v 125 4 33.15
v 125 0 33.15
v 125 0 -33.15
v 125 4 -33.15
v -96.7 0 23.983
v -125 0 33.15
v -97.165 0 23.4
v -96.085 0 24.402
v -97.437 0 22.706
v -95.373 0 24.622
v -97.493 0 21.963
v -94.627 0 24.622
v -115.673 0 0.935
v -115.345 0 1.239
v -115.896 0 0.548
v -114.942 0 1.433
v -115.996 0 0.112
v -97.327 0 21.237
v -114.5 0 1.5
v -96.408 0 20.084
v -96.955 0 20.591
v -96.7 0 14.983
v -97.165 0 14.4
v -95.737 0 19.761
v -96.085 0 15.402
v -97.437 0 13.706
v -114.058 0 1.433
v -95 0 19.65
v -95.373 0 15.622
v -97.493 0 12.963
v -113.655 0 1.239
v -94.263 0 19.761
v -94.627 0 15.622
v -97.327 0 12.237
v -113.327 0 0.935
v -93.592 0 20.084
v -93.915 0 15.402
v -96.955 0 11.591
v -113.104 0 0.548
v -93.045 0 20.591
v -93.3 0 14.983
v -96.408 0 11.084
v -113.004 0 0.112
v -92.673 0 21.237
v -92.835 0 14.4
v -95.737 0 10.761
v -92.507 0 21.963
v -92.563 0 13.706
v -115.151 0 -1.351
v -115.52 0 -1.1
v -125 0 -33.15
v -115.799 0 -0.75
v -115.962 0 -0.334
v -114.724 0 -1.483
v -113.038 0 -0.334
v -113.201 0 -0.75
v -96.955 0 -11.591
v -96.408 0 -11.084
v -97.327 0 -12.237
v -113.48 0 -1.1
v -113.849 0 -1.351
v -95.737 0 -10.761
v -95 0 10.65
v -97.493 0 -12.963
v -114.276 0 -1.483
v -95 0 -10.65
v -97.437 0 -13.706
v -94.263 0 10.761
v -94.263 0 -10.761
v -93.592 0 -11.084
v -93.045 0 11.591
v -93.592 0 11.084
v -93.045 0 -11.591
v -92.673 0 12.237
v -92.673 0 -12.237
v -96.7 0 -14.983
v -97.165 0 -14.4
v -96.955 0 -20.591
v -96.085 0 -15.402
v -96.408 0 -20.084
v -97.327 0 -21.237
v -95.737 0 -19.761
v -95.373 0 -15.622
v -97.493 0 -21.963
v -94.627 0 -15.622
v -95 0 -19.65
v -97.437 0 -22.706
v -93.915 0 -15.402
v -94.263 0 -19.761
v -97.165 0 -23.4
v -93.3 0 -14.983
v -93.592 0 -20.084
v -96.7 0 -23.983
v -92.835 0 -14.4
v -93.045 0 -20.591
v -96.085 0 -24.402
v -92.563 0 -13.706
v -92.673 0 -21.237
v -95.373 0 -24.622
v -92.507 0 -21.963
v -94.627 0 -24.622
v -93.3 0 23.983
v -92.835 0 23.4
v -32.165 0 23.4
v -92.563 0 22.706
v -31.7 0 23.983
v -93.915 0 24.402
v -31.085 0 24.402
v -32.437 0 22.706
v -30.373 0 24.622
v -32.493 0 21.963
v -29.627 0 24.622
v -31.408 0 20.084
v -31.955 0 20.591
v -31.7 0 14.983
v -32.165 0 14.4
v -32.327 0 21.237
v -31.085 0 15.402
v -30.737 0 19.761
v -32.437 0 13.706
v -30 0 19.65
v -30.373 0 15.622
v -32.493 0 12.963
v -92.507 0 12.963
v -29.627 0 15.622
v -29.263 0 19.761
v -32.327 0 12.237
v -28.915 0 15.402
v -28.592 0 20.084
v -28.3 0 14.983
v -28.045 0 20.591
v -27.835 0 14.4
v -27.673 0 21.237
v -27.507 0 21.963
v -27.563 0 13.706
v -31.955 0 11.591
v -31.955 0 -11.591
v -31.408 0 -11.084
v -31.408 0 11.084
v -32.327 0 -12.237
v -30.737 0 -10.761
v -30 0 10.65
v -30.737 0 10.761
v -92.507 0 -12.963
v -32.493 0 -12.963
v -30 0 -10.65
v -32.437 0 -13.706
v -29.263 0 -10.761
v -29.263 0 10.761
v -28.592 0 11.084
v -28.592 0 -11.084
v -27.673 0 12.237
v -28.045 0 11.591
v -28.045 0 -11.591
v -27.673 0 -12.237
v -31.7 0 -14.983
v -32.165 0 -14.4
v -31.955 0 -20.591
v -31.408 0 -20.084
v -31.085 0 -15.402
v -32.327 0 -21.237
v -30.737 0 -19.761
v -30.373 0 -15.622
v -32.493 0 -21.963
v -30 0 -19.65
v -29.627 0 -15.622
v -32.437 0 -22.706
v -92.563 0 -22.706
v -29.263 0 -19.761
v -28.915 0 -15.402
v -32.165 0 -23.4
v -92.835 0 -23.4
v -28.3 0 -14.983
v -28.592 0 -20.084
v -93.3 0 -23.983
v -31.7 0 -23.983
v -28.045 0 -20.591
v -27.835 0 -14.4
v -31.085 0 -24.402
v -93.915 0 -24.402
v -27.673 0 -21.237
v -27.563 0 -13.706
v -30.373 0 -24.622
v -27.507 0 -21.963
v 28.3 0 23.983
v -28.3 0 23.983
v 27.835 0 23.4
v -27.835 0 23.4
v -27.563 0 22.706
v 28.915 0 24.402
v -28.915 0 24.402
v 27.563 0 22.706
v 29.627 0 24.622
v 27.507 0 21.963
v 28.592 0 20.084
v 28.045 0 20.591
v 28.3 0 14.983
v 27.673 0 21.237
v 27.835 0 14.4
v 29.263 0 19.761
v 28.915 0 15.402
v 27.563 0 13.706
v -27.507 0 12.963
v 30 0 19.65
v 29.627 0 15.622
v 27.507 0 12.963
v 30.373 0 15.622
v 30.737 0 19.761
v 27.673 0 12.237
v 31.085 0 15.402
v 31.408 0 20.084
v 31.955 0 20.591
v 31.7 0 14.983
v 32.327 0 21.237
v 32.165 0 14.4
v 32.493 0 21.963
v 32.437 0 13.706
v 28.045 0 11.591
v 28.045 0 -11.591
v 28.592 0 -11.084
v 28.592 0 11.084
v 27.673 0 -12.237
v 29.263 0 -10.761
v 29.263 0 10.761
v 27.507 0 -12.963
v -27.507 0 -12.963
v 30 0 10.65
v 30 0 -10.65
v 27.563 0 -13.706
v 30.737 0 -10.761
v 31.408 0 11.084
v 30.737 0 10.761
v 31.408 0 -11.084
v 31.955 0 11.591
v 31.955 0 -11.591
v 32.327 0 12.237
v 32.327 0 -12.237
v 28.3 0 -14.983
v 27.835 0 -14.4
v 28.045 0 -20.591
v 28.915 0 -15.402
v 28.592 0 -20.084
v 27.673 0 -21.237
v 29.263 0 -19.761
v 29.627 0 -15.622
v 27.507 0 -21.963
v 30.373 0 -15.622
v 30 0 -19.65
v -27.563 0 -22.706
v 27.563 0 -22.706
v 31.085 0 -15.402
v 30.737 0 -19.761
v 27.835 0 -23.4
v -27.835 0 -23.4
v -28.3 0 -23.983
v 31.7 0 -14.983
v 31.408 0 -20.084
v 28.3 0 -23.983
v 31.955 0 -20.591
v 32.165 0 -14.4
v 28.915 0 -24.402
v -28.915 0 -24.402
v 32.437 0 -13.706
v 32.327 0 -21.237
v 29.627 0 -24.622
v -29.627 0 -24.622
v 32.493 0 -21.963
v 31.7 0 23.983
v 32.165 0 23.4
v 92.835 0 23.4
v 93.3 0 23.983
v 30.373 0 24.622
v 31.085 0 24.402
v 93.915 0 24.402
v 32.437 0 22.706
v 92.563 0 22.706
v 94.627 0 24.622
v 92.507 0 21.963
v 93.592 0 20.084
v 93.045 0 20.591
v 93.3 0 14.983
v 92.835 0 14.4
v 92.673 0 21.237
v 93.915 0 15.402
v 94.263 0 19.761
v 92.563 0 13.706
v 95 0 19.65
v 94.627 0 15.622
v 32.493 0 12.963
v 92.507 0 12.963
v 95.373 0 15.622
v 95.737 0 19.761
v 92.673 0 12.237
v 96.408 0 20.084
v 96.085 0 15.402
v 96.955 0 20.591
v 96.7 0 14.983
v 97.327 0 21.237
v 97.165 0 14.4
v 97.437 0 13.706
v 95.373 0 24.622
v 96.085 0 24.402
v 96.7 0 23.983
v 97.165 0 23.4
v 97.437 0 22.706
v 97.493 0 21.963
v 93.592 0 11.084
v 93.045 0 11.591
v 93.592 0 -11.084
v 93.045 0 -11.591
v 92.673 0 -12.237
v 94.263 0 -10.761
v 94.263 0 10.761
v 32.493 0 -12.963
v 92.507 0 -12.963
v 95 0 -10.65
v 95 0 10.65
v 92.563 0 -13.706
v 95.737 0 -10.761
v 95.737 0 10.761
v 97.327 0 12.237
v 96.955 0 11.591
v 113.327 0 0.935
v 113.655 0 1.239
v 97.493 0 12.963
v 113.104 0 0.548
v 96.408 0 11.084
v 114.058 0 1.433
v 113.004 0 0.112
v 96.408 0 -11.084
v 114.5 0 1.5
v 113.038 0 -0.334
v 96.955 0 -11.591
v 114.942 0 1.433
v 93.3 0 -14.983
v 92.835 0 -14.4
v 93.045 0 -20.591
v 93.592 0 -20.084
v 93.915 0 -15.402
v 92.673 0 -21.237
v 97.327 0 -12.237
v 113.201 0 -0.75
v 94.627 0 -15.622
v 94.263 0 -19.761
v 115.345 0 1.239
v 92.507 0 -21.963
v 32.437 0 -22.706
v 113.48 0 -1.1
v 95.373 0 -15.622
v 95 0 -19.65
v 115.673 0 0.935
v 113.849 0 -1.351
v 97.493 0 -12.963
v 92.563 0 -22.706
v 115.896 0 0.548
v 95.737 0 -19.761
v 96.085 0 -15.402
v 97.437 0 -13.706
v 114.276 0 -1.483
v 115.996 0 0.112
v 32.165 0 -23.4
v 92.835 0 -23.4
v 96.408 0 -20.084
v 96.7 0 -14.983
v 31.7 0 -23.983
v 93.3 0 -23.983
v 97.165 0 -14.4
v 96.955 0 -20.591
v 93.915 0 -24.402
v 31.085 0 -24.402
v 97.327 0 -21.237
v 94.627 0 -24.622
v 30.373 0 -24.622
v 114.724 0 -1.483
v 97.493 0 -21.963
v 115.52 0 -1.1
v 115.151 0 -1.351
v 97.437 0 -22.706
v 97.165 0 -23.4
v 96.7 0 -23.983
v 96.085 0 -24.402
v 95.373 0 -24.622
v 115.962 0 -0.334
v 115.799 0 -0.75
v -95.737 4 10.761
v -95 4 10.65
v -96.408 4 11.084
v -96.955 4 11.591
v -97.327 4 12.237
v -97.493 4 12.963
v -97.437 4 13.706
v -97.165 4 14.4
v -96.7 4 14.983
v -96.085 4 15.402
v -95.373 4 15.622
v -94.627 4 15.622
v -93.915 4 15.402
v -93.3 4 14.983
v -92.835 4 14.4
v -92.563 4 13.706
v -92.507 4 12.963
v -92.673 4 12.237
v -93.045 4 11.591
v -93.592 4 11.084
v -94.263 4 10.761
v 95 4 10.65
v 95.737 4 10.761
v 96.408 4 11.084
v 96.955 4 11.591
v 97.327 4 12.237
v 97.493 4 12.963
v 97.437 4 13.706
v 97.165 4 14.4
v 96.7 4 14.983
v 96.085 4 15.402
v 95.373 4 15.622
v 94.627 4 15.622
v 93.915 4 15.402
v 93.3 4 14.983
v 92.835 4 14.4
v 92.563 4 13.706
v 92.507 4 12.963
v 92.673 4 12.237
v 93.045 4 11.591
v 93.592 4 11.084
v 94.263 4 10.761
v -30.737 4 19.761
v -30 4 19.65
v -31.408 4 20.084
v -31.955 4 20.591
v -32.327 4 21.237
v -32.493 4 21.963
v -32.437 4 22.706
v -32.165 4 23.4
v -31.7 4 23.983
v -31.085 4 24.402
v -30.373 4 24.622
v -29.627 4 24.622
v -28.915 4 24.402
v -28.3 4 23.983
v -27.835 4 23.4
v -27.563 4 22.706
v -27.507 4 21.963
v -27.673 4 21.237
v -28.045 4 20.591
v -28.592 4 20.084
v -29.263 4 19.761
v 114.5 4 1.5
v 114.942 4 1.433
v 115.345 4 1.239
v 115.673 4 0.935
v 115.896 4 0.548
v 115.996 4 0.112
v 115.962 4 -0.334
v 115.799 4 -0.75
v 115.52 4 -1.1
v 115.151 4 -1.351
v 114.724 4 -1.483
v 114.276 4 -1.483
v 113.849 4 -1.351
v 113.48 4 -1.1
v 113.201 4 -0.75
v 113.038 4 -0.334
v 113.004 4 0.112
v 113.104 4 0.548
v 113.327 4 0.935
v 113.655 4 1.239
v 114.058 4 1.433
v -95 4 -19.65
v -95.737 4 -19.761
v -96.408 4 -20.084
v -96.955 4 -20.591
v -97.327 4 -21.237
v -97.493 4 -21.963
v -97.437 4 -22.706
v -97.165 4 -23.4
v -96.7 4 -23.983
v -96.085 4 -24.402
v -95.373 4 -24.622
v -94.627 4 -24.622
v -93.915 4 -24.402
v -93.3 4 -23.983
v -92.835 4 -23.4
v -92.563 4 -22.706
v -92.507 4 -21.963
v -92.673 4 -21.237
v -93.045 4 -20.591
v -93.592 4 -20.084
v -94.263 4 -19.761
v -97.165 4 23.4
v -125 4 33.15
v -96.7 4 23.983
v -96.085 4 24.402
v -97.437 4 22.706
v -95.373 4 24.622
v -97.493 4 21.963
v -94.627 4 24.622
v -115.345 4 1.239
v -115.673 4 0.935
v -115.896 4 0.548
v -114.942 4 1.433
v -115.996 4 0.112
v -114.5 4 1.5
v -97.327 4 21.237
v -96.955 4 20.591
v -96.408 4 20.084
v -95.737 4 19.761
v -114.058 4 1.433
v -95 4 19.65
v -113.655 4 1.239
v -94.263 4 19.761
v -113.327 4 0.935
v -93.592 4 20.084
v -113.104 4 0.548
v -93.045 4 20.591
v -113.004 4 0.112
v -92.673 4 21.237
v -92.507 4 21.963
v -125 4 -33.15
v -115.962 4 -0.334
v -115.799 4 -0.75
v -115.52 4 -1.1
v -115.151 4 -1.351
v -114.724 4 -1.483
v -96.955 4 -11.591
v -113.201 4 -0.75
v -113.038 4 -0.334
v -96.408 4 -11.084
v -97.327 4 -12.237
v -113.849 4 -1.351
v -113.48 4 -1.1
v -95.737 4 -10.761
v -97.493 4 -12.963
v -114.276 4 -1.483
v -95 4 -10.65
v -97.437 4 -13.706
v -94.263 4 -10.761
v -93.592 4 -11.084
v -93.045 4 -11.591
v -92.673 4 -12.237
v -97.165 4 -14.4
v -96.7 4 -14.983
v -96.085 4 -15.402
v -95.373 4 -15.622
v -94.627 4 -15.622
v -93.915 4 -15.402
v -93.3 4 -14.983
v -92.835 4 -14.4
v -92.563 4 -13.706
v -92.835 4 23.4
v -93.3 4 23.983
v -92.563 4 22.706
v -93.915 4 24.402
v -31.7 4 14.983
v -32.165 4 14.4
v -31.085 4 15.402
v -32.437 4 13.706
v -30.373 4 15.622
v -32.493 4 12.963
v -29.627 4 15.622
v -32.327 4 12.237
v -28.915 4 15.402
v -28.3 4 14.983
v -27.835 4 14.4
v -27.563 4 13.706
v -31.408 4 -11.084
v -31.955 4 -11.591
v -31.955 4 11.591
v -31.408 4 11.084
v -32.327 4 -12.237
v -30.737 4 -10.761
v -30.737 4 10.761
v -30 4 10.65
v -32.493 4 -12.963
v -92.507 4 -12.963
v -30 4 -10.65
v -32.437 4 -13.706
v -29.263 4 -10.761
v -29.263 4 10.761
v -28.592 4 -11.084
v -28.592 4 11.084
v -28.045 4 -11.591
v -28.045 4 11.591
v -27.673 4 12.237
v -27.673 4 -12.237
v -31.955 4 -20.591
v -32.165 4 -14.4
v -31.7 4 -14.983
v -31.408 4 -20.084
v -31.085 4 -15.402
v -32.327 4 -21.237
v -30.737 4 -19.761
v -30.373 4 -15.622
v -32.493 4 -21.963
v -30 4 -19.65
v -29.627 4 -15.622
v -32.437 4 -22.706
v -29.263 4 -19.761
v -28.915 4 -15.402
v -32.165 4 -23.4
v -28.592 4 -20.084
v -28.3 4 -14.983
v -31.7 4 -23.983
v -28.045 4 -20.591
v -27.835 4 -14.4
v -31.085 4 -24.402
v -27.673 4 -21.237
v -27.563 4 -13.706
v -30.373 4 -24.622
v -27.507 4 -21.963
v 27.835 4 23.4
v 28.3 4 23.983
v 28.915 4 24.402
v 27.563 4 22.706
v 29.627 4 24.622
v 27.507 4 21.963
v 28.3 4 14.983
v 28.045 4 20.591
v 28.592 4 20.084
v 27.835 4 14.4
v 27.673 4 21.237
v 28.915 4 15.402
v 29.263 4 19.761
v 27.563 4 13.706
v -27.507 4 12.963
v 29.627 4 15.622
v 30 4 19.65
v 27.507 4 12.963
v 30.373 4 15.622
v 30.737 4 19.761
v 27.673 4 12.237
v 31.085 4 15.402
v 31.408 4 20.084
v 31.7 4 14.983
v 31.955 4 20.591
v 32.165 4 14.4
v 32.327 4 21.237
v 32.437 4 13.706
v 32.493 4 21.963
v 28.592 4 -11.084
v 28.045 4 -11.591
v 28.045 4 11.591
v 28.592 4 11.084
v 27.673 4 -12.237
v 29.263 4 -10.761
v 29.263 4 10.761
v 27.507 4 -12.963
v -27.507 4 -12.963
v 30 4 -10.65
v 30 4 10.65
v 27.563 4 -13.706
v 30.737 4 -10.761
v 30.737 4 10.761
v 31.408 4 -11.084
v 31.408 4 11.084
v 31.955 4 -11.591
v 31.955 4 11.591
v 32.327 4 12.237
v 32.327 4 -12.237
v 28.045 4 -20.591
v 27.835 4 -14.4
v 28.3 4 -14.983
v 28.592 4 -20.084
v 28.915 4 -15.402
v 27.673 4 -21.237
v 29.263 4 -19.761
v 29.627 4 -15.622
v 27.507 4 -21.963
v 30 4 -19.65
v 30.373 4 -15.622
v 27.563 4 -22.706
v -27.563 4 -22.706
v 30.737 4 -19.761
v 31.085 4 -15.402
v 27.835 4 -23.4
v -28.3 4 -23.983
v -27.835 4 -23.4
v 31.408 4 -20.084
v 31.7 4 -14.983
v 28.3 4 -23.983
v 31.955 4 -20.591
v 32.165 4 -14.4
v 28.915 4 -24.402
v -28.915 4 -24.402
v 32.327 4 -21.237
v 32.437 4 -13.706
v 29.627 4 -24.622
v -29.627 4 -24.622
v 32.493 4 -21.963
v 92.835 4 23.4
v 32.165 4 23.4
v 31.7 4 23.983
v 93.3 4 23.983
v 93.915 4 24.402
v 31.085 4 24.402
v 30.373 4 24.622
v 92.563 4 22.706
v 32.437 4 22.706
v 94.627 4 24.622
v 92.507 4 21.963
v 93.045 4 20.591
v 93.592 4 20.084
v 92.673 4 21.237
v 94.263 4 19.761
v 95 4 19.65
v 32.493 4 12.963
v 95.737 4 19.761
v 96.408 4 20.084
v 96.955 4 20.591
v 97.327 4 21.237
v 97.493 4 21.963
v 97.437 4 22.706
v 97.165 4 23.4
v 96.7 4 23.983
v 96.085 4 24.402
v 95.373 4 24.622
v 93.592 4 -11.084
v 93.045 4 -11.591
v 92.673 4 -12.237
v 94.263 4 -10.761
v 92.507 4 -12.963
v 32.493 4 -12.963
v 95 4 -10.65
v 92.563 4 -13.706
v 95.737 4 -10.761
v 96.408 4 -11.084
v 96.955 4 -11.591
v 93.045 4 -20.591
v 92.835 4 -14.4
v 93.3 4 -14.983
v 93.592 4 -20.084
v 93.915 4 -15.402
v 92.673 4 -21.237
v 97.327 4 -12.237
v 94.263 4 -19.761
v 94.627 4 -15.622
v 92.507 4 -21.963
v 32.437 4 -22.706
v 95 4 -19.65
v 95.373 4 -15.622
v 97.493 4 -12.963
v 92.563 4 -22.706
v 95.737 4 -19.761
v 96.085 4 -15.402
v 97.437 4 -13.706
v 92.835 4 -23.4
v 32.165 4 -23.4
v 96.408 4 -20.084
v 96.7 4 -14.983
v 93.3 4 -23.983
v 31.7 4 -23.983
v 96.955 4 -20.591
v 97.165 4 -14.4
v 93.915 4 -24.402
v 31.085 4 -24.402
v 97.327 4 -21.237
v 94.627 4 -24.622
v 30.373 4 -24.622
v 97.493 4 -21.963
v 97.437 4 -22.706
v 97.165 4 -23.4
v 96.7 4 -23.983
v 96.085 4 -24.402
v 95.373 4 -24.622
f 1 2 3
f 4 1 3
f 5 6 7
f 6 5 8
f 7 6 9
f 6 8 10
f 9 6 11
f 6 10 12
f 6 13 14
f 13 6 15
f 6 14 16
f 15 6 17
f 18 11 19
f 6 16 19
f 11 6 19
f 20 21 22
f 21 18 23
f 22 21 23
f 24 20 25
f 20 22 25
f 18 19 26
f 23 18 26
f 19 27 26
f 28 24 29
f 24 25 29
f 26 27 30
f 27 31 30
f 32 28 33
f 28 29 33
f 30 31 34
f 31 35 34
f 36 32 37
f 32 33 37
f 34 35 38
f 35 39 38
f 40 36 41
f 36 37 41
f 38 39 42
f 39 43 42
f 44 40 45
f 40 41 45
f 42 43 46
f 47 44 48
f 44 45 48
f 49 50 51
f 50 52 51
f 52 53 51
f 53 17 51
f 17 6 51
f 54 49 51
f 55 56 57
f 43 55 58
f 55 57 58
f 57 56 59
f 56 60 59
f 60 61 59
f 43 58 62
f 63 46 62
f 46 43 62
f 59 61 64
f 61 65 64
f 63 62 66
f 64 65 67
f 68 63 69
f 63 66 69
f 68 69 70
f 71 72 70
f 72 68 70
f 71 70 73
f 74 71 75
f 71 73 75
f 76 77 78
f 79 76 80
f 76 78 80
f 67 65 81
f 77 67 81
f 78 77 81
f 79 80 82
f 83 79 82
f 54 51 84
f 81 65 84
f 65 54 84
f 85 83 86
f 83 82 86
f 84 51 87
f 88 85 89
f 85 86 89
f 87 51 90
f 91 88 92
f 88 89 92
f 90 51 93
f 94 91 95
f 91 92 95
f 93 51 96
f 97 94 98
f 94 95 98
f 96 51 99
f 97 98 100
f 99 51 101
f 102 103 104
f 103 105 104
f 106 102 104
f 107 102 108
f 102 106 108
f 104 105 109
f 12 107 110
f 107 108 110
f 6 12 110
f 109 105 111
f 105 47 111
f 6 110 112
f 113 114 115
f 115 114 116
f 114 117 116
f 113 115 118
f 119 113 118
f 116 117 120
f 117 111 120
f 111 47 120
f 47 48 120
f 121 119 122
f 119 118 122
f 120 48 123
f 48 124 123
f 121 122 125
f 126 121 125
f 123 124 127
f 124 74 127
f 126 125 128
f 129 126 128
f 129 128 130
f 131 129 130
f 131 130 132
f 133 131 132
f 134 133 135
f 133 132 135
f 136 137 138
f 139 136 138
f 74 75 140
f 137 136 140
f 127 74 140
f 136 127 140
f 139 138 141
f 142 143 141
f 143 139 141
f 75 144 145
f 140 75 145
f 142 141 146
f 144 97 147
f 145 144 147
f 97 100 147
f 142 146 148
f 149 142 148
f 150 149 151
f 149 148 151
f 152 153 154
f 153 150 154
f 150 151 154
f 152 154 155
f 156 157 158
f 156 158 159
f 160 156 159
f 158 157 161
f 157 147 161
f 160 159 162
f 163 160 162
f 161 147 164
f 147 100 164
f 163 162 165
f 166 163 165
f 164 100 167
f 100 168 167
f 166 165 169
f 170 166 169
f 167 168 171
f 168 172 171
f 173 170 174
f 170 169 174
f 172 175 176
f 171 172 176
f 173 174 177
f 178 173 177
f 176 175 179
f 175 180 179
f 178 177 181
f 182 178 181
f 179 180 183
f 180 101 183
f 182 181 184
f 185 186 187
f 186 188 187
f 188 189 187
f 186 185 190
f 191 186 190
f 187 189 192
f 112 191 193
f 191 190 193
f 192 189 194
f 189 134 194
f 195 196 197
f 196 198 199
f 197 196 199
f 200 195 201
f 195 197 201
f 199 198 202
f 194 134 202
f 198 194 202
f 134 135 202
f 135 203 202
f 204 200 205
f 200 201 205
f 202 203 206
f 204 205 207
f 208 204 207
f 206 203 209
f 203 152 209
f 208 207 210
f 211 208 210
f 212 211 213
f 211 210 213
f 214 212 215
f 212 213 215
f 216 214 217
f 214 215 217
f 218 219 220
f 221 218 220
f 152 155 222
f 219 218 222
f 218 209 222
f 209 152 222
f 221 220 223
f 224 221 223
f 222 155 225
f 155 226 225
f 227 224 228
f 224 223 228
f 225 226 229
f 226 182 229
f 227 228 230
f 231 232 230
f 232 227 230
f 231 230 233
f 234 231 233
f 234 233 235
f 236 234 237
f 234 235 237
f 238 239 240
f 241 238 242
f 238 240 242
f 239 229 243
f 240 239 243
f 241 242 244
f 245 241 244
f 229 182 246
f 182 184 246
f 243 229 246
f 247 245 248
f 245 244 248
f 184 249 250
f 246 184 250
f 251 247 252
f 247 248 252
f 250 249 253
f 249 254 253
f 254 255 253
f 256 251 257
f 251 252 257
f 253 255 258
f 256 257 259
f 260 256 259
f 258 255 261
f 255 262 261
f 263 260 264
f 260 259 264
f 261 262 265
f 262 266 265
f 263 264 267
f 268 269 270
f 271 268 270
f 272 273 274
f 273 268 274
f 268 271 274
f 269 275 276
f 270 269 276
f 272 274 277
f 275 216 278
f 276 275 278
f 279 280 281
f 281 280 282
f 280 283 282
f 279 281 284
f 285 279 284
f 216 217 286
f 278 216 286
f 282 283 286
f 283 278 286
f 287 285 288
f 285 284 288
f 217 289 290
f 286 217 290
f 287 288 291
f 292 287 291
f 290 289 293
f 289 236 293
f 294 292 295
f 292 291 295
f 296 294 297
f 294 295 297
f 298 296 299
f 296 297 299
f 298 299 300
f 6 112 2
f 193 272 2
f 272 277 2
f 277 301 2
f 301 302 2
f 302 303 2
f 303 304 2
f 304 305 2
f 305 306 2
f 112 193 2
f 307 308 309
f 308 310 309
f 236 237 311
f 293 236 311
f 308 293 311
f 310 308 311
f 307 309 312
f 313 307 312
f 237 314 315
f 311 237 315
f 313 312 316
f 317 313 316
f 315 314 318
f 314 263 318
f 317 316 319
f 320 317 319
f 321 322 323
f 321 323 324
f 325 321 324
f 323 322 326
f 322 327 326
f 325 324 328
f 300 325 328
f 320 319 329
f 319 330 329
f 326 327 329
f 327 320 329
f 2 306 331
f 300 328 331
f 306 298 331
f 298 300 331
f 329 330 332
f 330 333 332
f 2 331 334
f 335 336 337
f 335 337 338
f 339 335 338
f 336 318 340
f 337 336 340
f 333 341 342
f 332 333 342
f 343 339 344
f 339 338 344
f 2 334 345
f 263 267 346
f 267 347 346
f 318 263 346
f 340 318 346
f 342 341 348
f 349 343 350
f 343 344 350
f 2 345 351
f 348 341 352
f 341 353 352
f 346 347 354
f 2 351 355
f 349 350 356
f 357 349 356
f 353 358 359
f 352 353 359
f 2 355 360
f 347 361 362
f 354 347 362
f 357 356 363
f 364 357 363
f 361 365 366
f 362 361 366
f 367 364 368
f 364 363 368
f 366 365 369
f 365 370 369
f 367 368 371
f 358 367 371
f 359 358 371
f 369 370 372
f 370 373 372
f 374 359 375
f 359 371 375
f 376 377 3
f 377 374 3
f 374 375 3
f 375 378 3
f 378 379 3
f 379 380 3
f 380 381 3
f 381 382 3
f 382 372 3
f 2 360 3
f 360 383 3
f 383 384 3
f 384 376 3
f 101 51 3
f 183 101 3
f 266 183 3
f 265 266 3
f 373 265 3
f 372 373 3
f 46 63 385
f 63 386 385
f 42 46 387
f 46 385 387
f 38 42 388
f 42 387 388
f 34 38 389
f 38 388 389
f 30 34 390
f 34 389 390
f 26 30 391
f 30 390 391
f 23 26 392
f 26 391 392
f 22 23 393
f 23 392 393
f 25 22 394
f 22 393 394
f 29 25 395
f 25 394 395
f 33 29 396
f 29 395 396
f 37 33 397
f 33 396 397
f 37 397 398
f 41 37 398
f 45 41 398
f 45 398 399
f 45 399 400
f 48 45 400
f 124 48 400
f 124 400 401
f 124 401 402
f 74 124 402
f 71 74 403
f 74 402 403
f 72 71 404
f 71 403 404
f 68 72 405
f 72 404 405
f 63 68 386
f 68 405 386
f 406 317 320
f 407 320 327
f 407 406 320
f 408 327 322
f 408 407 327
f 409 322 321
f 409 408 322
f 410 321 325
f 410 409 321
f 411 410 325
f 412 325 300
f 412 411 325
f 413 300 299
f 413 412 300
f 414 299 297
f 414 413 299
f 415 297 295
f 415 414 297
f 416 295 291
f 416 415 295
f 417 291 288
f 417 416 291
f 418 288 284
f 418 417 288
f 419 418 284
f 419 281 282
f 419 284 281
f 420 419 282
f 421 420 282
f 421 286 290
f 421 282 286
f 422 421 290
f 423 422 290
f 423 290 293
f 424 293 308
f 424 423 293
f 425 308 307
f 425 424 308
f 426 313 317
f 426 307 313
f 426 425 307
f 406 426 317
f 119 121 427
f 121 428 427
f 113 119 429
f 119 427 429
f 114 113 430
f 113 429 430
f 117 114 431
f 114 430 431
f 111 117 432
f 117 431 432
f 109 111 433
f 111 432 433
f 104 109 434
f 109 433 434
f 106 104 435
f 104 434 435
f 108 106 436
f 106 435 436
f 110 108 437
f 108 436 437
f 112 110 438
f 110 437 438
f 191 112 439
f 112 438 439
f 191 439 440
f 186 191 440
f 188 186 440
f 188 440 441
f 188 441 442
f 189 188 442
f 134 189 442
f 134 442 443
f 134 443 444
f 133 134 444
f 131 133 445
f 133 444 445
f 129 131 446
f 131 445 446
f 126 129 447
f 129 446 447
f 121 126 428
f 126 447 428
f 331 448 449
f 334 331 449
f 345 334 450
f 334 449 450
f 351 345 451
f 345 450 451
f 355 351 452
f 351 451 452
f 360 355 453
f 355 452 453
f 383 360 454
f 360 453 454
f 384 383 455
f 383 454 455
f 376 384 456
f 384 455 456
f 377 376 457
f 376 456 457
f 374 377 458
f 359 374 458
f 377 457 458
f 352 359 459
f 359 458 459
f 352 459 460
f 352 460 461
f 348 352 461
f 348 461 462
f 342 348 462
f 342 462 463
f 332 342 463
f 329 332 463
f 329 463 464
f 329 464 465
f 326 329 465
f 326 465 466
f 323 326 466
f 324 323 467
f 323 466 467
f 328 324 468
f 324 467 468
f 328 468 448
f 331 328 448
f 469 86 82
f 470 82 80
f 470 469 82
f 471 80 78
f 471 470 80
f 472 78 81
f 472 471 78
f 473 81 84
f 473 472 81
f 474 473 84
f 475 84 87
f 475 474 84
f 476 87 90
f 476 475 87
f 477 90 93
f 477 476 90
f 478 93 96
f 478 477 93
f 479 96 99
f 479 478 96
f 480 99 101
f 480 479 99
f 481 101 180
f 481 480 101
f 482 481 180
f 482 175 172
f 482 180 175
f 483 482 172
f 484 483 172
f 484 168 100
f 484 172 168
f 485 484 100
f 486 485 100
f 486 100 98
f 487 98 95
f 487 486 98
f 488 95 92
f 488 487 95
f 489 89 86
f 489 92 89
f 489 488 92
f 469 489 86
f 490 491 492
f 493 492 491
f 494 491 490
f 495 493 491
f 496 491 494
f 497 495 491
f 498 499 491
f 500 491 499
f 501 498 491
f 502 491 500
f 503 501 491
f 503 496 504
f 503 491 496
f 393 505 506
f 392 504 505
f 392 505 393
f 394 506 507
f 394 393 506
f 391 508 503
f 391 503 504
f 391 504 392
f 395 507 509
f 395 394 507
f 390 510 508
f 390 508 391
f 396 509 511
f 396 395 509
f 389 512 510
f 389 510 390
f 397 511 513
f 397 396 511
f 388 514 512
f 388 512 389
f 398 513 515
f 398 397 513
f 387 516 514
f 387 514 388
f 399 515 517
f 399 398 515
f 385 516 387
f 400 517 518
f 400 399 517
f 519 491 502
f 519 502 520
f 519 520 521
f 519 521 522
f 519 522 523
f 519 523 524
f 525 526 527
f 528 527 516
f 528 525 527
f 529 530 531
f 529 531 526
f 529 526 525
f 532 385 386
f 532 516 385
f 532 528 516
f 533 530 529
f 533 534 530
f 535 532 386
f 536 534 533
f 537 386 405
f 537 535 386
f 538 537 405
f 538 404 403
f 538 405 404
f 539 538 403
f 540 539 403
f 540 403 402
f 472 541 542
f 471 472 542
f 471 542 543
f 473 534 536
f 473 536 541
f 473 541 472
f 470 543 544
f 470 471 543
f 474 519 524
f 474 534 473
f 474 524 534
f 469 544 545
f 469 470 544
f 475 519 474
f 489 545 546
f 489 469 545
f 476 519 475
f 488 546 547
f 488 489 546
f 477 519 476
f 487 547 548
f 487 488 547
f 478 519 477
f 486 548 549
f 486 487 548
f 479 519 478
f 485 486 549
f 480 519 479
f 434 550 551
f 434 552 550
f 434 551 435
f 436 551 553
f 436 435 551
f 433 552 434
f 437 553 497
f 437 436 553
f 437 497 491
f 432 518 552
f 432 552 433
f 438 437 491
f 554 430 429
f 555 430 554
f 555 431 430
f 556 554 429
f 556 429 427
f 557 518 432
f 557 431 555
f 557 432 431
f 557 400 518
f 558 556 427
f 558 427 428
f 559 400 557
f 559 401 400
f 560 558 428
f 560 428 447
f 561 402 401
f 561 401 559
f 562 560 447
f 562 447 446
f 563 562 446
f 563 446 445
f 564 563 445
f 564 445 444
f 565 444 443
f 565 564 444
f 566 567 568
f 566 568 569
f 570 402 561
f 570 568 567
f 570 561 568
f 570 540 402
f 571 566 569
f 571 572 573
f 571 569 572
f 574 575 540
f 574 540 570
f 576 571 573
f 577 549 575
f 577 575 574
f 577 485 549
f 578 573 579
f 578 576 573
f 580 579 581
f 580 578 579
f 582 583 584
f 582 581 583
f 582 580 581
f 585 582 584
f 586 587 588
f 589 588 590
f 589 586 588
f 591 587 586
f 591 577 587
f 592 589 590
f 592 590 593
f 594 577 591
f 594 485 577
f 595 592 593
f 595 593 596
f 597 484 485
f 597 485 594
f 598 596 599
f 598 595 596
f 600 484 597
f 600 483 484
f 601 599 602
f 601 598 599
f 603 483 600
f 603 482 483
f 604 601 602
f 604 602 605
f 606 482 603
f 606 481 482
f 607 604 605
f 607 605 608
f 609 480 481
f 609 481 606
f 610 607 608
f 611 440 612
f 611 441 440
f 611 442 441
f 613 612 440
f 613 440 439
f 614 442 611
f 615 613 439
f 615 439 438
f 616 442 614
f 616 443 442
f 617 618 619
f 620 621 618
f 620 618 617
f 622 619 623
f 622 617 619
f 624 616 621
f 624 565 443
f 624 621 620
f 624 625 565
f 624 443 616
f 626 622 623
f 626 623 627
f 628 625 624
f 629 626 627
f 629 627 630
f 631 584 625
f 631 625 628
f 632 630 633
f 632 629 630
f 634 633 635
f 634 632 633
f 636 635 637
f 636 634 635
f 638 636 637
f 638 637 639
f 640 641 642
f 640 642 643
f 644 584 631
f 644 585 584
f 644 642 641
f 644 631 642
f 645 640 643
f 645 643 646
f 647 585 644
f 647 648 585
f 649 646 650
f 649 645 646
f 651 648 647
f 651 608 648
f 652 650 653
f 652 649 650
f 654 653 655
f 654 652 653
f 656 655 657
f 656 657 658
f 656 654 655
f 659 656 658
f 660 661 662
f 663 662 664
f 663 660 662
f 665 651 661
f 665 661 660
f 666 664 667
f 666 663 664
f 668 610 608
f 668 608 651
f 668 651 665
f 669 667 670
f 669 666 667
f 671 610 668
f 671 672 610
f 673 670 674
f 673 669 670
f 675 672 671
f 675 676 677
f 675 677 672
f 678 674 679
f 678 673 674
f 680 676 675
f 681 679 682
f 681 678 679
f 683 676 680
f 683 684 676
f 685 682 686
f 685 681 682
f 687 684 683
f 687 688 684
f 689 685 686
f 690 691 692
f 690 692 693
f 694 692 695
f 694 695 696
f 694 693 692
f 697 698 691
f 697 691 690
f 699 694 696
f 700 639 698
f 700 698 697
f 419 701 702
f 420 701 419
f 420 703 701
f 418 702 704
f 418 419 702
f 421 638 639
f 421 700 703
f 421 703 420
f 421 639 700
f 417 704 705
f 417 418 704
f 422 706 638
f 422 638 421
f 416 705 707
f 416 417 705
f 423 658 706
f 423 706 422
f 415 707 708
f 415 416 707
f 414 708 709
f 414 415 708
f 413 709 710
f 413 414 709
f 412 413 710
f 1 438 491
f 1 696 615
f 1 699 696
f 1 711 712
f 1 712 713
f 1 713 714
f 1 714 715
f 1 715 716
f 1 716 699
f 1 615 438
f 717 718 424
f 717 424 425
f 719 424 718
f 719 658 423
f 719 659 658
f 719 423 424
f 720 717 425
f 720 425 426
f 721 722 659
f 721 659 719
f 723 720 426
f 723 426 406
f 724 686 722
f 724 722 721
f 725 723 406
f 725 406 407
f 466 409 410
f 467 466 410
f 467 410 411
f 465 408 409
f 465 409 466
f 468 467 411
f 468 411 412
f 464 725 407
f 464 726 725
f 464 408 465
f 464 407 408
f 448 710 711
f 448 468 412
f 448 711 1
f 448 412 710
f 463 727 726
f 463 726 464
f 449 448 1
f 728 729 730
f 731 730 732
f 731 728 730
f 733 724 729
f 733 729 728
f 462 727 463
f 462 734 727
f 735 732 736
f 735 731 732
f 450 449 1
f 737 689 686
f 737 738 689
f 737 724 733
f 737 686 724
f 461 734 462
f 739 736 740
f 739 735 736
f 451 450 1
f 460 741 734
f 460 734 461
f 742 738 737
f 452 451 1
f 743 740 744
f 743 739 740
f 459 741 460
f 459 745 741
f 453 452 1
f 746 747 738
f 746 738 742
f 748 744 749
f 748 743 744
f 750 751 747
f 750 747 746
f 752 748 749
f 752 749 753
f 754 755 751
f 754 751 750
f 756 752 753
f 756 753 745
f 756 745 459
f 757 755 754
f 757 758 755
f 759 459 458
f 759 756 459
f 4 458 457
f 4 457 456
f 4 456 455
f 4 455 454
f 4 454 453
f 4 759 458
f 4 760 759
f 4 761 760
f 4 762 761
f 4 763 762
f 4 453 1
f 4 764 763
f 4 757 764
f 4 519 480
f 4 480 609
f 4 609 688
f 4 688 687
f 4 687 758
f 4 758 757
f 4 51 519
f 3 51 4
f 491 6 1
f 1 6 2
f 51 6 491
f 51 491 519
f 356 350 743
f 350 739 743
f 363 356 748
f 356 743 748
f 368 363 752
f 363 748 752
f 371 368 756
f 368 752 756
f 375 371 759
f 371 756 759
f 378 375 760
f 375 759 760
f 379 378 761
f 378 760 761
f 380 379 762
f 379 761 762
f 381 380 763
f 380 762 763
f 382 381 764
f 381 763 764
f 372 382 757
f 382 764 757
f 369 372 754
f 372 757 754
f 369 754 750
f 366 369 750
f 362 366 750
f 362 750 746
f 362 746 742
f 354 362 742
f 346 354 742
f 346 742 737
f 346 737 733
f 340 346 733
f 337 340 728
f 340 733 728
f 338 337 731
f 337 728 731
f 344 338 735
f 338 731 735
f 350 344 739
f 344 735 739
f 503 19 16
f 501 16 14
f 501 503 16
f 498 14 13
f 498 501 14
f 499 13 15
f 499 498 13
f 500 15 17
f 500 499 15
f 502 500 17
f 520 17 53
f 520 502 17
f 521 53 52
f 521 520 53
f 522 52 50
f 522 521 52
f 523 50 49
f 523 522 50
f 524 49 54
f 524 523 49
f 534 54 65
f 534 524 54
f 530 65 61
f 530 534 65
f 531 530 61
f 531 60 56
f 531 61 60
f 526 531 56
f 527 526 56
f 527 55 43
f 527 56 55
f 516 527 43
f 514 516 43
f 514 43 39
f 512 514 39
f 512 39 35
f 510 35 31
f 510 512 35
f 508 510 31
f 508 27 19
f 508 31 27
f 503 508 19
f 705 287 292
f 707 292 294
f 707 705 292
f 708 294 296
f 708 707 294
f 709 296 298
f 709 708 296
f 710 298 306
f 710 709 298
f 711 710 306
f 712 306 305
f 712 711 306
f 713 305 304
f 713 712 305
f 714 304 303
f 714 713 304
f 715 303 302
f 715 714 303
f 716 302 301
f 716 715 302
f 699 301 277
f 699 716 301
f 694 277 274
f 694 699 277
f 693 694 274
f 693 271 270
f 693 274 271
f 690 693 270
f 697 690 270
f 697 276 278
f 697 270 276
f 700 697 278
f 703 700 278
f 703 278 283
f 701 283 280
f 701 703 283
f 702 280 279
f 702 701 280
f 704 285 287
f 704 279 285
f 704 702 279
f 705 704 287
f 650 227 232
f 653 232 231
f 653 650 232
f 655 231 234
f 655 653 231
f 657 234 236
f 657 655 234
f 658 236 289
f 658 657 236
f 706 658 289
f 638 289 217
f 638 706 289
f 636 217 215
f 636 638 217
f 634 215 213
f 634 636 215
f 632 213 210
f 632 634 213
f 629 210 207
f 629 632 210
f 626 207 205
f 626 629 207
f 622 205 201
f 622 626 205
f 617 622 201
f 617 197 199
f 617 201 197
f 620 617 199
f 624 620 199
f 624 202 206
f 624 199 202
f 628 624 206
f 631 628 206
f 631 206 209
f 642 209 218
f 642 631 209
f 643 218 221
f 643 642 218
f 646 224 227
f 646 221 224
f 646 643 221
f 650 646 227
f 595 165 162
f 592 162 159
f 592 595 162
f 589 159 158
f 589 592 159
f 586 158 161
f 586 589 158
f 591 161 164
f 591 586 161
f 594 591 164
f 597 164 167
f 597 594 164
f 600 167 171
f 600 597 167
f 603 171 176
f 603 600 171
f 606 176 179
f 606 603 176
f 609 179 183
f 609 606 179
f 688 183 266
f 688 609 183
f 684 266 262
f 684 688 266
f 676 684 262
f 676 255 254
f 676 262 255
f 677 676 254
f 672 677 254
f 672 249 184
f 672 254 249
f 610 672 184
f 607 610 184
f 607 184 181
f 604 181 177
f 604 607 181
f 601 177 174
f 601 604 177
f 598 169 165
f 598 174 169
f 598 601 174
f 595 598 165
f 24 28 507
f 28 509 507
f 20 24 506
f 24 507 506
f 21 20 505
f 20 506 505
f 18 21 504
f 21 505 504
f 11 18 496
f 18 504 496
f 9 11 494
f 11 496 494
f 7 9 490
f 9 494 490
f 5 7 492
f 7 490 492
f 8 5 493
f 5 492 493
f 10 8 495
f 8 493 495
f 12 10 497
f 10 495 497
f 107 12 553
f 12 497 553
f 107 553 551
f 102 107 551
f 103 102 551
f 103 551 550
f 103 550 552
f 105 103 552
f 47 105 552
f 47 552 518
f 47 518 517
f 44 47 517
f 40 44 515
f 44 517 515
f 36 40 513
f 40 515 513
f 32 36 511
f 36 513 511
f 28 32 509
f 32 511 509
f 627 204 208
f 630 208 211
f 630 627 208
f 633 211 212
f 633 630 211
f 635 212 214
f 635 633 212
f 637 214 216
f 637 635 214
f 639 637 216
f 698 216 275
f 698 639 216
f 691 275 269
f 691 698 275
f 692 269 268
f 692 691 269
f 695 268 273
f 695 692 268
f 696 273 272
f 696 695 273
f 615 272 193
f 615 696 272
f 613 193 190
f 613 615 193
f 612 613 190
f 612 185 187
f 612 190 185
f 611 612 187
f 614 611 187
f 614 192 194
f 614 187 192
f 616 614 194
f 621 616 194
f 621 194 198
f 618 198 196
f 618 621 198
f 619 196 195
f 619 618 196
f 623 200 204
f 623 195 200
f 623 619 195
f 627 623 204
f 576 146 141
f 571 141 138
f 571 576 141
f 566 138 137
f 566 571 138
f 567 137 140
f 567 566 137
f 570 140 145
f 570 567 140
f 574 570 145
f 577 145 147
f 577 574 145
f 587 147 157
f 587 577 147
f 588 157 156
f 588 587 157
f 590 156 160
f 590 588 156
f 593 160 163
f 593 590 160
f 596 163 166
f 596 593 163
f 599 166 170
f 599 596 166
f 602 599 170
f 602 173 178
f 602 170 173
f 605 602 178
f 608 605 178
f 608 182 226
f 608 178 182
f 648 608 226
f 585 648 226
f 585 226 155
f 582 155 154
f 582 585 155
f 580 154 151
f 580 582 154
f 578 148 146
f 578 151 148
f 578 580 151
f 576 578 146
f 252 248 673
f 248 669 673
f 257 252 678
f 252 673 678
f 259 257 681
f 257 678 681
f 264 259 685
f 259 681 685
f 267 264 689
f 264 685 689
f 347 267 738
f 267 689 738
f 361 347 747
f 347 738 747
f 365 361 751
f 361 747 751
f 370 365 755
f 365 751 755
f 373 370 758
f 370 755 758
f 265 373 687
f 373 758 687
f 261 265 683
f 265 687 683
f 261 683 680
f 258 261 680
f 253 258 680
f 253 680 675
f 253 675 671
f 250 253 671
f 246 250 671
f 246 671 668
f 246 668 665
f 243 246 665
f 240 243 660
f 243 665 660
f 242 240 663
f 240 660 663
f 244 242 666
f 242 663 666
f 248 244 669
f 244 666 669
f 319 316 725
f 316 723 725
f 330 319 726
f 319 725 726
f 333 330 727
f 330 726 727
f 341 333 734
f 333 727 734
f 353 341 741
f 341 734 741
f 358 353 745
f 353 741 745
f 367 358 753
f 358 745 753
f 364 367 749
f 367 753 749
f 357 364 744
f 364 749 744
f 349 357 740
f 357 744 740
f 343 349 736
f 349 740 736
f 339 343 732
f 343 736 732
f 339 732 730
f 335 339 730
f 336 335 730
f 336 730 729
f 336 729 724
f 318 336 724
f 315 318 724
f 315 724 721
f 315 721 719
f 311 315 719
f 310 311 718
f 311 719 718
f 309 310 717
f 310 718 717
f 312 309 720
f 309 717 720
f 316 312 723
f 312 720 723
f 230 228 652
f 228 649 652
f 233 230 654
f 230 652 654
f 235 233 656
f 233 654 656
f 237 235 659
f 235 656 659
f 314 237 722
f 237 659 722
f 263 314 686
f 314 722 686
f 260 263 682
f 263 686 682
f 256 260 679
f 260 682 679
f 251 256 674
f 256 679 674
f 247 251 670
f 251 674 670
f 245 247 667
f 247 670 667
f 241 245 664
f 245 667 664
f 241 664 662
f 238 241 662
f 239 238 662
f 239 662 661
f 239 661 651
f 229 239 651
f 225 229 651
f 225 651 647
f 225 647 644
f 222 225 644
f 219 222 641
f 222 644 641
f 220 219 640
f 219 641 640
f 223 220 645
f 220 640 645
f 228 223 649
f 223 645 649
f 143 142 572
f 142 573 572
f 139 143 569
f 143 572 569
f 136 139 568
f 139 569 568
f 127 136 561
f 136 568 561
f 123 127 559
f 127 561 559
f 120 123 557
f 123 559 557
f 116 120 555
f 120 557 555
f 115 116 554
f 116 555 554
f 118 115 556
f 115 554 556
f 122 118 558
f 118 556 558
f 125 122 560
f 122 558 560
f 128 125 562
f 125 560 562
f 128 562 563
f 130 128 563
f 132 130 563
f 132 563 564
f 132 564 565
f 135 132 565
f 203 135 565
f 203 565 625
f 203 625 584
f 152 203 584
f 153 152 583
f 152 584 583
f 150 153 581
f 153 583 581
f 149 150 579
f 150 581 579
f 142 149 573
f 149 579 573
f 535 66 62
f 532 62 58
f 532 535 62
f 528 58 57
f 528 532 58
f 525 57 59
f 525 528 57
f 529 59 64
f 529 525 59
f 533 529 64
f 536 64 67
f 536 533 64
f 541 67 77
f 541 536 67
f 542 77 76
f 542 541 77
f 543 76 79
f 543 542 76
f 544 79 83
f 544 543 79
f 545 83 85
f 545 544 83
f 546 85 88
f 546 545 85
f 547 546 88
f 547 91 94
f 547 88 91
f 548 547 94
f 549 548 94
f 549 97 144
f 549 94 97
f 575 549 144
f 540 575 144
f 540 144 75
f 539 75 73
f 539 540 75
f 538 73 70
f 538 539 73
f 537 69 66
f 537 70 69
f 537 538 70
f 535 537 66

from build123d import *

# Parameters (mm, degrees)
SKETCH1_W                      = 250
SKETCH1_H                      = 66.3
BOSS_EXTRUDE1_DEPTH            = 4
F_5_0MM_DOWEL_HOLE2_AT_2_COUNT = 2
F_5_0MM_DOWEL_HOLE2_AT_2_PITCH = 9
LPATTERN2_COUNT                = 2
LPATTERN2_PITCH                = 65


with BuildPart() as part:
    # Sketch1 → Boss-Extrude1 (new body)
    with BuildSketch(Plane(origin=(0, 0, 0), x_dir=(1, 0, 0), z_dir=(0, 1, 0))):
        Rectangle(SKETCH1_W, SKETCH1_H)
    extrude(amount=BOSS_EXTRUDE1_DEPTH)

    # Sketch5 → Ø3.0mm Dowel Hole1 (revolve, cut)
    with BuildSketch(Plane(origin=(-114.5, 4, 0), x_dir=(0, 0, 1), z_dir=(1, 0, 0))):
        Polygon((0, 0), (0, 100.901290929), (1.5, 100), (1.5, 0), align=None)
    f_3_0mm_dowel_hole1 = revolve(axis=Axis((-114.5, 10.35, 0), (0, -1, 0)), mode=Mode.SUBTRACT)

    # Sketch7 → Ø5.0mm Dowel Hole2 (revolve, cut)
    with BuildSketch(Plane(origin=(-95, 4, -22.15), x_dir=(0, 0, 1), z_dir=(1, 0, 0))):
        Polygon((0, 0), (0, 51.502151548), (2.5, 50), (2.5, 0), align=None)
    f_5_0mm_dowel_hole2 = revolve(axis=Axis((-95, 10.35, -22.15), (0, -1, 0)), mode=Mode.SUBTRACT)

    # Ø5.0mm Dowel Hole2 at 2: Ø5.0mm Dowel Hole2 ×2
    with Locations(*[(0, 0, i * F_5_0MM_DOWEL_HOLE2_AT_2_PITCH) for i in range(1, F_5_0MM_DOWEL_HOLE2_AT_2_COUNT)]):
        add(f_5_0mm_dowel_hole2, mode=Mode.SUBTRACT)

    # LPattern2: Ø5.0mm Dowel Hole2 ×2
    with Locations(*[(i * LPATTERN2_PITCH, 0, 0) for i in range(1, LPATTERN2_COUNT)]):
        add(f_5_0mm_dowel_hole2, mode=Mode.SUBTRACT)

    # LPattern2 copy 1 sketch → LPattern2 copy 1 (revolve, cut)
    with BuildSketch(Plane(origin=(-30, 4, -13.15), x_dir=(0, 0, 1), z_dir=(1, 0, 0))):
        Polygon((0, 0), (0, 51.502151548), (2.5, 50), (2.5, 0), align=None)
    revolve(axis=Axis((-30, 10.35, -13.15), (0, -1, 0)), mode=Mode.SUBTRACT)

    # Mirror3: Ø3.0mm Dowel Hole1, Ø5.0mm Dowel Hole2 across plane
    add(f_3_0mm_dowel_hole1.mirror(Plane(origin=(0, 0, 0), x_dir=(0, 0, 1), z_dir=(1, 0, 0))), mode=Mode.SUBTRACT)
    add(f_5_0mm_dowel_hole2.mirror(Plane(origin=(0, 0, 0), x_dir=(0, 0, 1), z_dir=(1, 0, 0))), mode=Mode.SUBTRACT)

    # Mirror3 copy 1 sketch → Mirror3 copy 1 (revolve, cut)
    with BuildSketch(Plane(origin=(95, 4, -13.15), x_dir=(0, 0, 1), z_dir=(-1, 0, 0))):
        Polygon((0, 0), (0, -51.502151548), (2.5, -50), (2.5, 0), align=None)
    revolve(axis=Axis((95, 10.35, -13.15), (0, 1, 0)), mode=Mode.SUBTRACT)

    # Mirror3 copy 2 sketch → Mirror3 copy 2 (revolve, cut)
    with BuildSketch(Plane(origin=(30, 4, -22.15), x_dir=(0, 0, 1), z_dir=(-1, 0, 0))):
        Polygon((0, 0), (0, -51.502151548), (2.5, -50), (2.5, 0), align=None)
    revolve(axis=Axis((30, 10.35, -22.15), (0, 1, 0)), mode=Mode.SUBTRACT)

    # Mirror3 copy 3 sketch → Mirror3 copy 3 (revolve, cut)
    with BuildSketch(Plane(origin=(30, 4, -13.15), x_dir=(0, 0, 1), z_dir=(-1, 0, 0))):
        Polygon((0, 0), (0, -51.502151548), (2.5, -50), (2.5, 0), align=None)
    revolve(axis=Axis((30, 10.35, -13.15), (0, 1, 0)), mode=Mode.SUBTRACT)

    # Mirror4: Ø5.0mm Dowel Hole2 across plane
    add(f_5_0mm_dowel_hole2.mirror(Plane.XY), mode=Mode.SUBTRACT)

    # Mirror4 copy 1 sketch → Mirror4 copy 1 (revolve, cut)
    with BuildSketch(Plane(origin=(-95, 4, 13.15), x_dir=(0, 0, -1), z_dir=(1, 0, 0))):
        Polygon((0, 0), (0, -51.502151548), (2.5, -50), (2.5, 0), align=None)
    revolve(axis=Axis((-95, 10.35, 13.15), (0, 1, 0)), mode=Mode.SUBTRACT)

    # Mirror4 copy 2 sketch → Mirror4 copy 2 (revolve, cut)
    with BuildSketch(Plane(origin=(-30, 4, 22.15), x_dir=(0, 0, -1), z_dir=(1, 0, 0))):
        Polygon((0, 0), (0, -51.502151548), (2.5, -50), (2.5, 0), align=None)
    revolve(axis=Axis((-30, 10.35, 22.15), (0, 1, 0)), mode=Mode.SUBTRACT)

    # Mirror4 copy 3 sketch → Mirror4 copy 3 (revolve, cut)
    with BuildSketch(Plane(origin=(-30, 4, 13.15), x_dir=(0, 0, -1), z_dir=(1, 0, 0))):
        Polygon((0, 0), (0, -51.502151548), (2.5, -50), (2.5, 0), align=None)
    revolve(axis=Axis((-30, 10.35, 13.15), (0, 1, 0)), mode=Mode.SUBTRACT)

    # Mirror4 copy 4 sketch → Mirror4 copy 4 (revolve, cut)
    with BuildSketch(Plane(origin=(114.5, 4, 0), x_dir=(0, 0, -1), z_dir=(-1, 0, 0))):
        Polygon((0, 0), (0, 100.901290929), (1.5, 100), (1.5, 0), align=None)
    revolve(axis=Axis((114.5, 10.35, 0), (0, -1, 0)), mode=Mode.SUBTRACT)

    # Mirror4 copy 5 sketch → Mirror4 copy 5 (revolve, cut)
    with BuildSketch(Plane(origin=(95, 4, 22.15), x_dir=(0, 0, -1), z_dir=(-1, 0, 0))):
        Polygon((0, 0), (0, 51.502151548), (2.5, 50), (2.5, 0), align=None)
    revolve(axis=Axis((95, 10.35, 22.15), (0, -1, 0)), mode=Mode.SUBTRACT)

    # Mirror4 copy 6 sketch → Mirror4 copy 6 (revolve, cut)
    with BuildSketch(Plane(origin=(95, 4, 13.15), x_dir=(0, 0, -1), z_dir=(-1, 0, 0))):
        Polygon((0, 0), (0, 51.502151548), (2.5, 50), (2.5, 0), align=None)
    revolve(axis=Axis((95, 10.35, 13.15), (0, -1, 0)), mode=Mode.SUBTRACT)

    # Mirror4 copy 7 sketch → Mirror4 copy 7 (revolve, cut)
    with BuildSketch(Plane(origin=(30, 4, 22.15), x_dir=(0, 0, -1), z_dir=(-1, 0, 0))):
        Polygon((0, 0), (0, 51.502151548), (2.5, 50), (2.5, 0), align=None)
    revolve(axis=Axis((30, 10.35, 22.15), (0, -1, 0)), mode=Mode.SUBTRACT)

    # Mirror4 copy 8 sketch → Mirror4 copy 8 (revolve, cut)
    with BuildSketch(Plane(origin=(30, 4, 13.15), x_dir=(0, 0, -1), z_dir=(-1, 0, 0))):
        Polygon((0, 0), (0, 51.502151548), (2.5, 50), (2.5, 0), align=None)
    revolve(axis=Axis((30, 10.35, 13.15), (0, -1, 0)), mode=Mode.SUBTRACT)

    # Mirror4 copy 9 sketch → Mirror4 copy 9 (revolve, cut)
    with BuildSketch(Plane(origin=(-114.5, 4, 0), x_dir=(0, 0, -1), z_dir=(1, 0, 0))):
        Polygon((0, 0), (0, -100.901290929), (1.5, -100), (1.5, 0), align=None)
    revolve(axis=Axis((-114.5, 10.35, 0), (0, 1, 0)), mode=Mode.SUBTRACT)


solid = part.part
